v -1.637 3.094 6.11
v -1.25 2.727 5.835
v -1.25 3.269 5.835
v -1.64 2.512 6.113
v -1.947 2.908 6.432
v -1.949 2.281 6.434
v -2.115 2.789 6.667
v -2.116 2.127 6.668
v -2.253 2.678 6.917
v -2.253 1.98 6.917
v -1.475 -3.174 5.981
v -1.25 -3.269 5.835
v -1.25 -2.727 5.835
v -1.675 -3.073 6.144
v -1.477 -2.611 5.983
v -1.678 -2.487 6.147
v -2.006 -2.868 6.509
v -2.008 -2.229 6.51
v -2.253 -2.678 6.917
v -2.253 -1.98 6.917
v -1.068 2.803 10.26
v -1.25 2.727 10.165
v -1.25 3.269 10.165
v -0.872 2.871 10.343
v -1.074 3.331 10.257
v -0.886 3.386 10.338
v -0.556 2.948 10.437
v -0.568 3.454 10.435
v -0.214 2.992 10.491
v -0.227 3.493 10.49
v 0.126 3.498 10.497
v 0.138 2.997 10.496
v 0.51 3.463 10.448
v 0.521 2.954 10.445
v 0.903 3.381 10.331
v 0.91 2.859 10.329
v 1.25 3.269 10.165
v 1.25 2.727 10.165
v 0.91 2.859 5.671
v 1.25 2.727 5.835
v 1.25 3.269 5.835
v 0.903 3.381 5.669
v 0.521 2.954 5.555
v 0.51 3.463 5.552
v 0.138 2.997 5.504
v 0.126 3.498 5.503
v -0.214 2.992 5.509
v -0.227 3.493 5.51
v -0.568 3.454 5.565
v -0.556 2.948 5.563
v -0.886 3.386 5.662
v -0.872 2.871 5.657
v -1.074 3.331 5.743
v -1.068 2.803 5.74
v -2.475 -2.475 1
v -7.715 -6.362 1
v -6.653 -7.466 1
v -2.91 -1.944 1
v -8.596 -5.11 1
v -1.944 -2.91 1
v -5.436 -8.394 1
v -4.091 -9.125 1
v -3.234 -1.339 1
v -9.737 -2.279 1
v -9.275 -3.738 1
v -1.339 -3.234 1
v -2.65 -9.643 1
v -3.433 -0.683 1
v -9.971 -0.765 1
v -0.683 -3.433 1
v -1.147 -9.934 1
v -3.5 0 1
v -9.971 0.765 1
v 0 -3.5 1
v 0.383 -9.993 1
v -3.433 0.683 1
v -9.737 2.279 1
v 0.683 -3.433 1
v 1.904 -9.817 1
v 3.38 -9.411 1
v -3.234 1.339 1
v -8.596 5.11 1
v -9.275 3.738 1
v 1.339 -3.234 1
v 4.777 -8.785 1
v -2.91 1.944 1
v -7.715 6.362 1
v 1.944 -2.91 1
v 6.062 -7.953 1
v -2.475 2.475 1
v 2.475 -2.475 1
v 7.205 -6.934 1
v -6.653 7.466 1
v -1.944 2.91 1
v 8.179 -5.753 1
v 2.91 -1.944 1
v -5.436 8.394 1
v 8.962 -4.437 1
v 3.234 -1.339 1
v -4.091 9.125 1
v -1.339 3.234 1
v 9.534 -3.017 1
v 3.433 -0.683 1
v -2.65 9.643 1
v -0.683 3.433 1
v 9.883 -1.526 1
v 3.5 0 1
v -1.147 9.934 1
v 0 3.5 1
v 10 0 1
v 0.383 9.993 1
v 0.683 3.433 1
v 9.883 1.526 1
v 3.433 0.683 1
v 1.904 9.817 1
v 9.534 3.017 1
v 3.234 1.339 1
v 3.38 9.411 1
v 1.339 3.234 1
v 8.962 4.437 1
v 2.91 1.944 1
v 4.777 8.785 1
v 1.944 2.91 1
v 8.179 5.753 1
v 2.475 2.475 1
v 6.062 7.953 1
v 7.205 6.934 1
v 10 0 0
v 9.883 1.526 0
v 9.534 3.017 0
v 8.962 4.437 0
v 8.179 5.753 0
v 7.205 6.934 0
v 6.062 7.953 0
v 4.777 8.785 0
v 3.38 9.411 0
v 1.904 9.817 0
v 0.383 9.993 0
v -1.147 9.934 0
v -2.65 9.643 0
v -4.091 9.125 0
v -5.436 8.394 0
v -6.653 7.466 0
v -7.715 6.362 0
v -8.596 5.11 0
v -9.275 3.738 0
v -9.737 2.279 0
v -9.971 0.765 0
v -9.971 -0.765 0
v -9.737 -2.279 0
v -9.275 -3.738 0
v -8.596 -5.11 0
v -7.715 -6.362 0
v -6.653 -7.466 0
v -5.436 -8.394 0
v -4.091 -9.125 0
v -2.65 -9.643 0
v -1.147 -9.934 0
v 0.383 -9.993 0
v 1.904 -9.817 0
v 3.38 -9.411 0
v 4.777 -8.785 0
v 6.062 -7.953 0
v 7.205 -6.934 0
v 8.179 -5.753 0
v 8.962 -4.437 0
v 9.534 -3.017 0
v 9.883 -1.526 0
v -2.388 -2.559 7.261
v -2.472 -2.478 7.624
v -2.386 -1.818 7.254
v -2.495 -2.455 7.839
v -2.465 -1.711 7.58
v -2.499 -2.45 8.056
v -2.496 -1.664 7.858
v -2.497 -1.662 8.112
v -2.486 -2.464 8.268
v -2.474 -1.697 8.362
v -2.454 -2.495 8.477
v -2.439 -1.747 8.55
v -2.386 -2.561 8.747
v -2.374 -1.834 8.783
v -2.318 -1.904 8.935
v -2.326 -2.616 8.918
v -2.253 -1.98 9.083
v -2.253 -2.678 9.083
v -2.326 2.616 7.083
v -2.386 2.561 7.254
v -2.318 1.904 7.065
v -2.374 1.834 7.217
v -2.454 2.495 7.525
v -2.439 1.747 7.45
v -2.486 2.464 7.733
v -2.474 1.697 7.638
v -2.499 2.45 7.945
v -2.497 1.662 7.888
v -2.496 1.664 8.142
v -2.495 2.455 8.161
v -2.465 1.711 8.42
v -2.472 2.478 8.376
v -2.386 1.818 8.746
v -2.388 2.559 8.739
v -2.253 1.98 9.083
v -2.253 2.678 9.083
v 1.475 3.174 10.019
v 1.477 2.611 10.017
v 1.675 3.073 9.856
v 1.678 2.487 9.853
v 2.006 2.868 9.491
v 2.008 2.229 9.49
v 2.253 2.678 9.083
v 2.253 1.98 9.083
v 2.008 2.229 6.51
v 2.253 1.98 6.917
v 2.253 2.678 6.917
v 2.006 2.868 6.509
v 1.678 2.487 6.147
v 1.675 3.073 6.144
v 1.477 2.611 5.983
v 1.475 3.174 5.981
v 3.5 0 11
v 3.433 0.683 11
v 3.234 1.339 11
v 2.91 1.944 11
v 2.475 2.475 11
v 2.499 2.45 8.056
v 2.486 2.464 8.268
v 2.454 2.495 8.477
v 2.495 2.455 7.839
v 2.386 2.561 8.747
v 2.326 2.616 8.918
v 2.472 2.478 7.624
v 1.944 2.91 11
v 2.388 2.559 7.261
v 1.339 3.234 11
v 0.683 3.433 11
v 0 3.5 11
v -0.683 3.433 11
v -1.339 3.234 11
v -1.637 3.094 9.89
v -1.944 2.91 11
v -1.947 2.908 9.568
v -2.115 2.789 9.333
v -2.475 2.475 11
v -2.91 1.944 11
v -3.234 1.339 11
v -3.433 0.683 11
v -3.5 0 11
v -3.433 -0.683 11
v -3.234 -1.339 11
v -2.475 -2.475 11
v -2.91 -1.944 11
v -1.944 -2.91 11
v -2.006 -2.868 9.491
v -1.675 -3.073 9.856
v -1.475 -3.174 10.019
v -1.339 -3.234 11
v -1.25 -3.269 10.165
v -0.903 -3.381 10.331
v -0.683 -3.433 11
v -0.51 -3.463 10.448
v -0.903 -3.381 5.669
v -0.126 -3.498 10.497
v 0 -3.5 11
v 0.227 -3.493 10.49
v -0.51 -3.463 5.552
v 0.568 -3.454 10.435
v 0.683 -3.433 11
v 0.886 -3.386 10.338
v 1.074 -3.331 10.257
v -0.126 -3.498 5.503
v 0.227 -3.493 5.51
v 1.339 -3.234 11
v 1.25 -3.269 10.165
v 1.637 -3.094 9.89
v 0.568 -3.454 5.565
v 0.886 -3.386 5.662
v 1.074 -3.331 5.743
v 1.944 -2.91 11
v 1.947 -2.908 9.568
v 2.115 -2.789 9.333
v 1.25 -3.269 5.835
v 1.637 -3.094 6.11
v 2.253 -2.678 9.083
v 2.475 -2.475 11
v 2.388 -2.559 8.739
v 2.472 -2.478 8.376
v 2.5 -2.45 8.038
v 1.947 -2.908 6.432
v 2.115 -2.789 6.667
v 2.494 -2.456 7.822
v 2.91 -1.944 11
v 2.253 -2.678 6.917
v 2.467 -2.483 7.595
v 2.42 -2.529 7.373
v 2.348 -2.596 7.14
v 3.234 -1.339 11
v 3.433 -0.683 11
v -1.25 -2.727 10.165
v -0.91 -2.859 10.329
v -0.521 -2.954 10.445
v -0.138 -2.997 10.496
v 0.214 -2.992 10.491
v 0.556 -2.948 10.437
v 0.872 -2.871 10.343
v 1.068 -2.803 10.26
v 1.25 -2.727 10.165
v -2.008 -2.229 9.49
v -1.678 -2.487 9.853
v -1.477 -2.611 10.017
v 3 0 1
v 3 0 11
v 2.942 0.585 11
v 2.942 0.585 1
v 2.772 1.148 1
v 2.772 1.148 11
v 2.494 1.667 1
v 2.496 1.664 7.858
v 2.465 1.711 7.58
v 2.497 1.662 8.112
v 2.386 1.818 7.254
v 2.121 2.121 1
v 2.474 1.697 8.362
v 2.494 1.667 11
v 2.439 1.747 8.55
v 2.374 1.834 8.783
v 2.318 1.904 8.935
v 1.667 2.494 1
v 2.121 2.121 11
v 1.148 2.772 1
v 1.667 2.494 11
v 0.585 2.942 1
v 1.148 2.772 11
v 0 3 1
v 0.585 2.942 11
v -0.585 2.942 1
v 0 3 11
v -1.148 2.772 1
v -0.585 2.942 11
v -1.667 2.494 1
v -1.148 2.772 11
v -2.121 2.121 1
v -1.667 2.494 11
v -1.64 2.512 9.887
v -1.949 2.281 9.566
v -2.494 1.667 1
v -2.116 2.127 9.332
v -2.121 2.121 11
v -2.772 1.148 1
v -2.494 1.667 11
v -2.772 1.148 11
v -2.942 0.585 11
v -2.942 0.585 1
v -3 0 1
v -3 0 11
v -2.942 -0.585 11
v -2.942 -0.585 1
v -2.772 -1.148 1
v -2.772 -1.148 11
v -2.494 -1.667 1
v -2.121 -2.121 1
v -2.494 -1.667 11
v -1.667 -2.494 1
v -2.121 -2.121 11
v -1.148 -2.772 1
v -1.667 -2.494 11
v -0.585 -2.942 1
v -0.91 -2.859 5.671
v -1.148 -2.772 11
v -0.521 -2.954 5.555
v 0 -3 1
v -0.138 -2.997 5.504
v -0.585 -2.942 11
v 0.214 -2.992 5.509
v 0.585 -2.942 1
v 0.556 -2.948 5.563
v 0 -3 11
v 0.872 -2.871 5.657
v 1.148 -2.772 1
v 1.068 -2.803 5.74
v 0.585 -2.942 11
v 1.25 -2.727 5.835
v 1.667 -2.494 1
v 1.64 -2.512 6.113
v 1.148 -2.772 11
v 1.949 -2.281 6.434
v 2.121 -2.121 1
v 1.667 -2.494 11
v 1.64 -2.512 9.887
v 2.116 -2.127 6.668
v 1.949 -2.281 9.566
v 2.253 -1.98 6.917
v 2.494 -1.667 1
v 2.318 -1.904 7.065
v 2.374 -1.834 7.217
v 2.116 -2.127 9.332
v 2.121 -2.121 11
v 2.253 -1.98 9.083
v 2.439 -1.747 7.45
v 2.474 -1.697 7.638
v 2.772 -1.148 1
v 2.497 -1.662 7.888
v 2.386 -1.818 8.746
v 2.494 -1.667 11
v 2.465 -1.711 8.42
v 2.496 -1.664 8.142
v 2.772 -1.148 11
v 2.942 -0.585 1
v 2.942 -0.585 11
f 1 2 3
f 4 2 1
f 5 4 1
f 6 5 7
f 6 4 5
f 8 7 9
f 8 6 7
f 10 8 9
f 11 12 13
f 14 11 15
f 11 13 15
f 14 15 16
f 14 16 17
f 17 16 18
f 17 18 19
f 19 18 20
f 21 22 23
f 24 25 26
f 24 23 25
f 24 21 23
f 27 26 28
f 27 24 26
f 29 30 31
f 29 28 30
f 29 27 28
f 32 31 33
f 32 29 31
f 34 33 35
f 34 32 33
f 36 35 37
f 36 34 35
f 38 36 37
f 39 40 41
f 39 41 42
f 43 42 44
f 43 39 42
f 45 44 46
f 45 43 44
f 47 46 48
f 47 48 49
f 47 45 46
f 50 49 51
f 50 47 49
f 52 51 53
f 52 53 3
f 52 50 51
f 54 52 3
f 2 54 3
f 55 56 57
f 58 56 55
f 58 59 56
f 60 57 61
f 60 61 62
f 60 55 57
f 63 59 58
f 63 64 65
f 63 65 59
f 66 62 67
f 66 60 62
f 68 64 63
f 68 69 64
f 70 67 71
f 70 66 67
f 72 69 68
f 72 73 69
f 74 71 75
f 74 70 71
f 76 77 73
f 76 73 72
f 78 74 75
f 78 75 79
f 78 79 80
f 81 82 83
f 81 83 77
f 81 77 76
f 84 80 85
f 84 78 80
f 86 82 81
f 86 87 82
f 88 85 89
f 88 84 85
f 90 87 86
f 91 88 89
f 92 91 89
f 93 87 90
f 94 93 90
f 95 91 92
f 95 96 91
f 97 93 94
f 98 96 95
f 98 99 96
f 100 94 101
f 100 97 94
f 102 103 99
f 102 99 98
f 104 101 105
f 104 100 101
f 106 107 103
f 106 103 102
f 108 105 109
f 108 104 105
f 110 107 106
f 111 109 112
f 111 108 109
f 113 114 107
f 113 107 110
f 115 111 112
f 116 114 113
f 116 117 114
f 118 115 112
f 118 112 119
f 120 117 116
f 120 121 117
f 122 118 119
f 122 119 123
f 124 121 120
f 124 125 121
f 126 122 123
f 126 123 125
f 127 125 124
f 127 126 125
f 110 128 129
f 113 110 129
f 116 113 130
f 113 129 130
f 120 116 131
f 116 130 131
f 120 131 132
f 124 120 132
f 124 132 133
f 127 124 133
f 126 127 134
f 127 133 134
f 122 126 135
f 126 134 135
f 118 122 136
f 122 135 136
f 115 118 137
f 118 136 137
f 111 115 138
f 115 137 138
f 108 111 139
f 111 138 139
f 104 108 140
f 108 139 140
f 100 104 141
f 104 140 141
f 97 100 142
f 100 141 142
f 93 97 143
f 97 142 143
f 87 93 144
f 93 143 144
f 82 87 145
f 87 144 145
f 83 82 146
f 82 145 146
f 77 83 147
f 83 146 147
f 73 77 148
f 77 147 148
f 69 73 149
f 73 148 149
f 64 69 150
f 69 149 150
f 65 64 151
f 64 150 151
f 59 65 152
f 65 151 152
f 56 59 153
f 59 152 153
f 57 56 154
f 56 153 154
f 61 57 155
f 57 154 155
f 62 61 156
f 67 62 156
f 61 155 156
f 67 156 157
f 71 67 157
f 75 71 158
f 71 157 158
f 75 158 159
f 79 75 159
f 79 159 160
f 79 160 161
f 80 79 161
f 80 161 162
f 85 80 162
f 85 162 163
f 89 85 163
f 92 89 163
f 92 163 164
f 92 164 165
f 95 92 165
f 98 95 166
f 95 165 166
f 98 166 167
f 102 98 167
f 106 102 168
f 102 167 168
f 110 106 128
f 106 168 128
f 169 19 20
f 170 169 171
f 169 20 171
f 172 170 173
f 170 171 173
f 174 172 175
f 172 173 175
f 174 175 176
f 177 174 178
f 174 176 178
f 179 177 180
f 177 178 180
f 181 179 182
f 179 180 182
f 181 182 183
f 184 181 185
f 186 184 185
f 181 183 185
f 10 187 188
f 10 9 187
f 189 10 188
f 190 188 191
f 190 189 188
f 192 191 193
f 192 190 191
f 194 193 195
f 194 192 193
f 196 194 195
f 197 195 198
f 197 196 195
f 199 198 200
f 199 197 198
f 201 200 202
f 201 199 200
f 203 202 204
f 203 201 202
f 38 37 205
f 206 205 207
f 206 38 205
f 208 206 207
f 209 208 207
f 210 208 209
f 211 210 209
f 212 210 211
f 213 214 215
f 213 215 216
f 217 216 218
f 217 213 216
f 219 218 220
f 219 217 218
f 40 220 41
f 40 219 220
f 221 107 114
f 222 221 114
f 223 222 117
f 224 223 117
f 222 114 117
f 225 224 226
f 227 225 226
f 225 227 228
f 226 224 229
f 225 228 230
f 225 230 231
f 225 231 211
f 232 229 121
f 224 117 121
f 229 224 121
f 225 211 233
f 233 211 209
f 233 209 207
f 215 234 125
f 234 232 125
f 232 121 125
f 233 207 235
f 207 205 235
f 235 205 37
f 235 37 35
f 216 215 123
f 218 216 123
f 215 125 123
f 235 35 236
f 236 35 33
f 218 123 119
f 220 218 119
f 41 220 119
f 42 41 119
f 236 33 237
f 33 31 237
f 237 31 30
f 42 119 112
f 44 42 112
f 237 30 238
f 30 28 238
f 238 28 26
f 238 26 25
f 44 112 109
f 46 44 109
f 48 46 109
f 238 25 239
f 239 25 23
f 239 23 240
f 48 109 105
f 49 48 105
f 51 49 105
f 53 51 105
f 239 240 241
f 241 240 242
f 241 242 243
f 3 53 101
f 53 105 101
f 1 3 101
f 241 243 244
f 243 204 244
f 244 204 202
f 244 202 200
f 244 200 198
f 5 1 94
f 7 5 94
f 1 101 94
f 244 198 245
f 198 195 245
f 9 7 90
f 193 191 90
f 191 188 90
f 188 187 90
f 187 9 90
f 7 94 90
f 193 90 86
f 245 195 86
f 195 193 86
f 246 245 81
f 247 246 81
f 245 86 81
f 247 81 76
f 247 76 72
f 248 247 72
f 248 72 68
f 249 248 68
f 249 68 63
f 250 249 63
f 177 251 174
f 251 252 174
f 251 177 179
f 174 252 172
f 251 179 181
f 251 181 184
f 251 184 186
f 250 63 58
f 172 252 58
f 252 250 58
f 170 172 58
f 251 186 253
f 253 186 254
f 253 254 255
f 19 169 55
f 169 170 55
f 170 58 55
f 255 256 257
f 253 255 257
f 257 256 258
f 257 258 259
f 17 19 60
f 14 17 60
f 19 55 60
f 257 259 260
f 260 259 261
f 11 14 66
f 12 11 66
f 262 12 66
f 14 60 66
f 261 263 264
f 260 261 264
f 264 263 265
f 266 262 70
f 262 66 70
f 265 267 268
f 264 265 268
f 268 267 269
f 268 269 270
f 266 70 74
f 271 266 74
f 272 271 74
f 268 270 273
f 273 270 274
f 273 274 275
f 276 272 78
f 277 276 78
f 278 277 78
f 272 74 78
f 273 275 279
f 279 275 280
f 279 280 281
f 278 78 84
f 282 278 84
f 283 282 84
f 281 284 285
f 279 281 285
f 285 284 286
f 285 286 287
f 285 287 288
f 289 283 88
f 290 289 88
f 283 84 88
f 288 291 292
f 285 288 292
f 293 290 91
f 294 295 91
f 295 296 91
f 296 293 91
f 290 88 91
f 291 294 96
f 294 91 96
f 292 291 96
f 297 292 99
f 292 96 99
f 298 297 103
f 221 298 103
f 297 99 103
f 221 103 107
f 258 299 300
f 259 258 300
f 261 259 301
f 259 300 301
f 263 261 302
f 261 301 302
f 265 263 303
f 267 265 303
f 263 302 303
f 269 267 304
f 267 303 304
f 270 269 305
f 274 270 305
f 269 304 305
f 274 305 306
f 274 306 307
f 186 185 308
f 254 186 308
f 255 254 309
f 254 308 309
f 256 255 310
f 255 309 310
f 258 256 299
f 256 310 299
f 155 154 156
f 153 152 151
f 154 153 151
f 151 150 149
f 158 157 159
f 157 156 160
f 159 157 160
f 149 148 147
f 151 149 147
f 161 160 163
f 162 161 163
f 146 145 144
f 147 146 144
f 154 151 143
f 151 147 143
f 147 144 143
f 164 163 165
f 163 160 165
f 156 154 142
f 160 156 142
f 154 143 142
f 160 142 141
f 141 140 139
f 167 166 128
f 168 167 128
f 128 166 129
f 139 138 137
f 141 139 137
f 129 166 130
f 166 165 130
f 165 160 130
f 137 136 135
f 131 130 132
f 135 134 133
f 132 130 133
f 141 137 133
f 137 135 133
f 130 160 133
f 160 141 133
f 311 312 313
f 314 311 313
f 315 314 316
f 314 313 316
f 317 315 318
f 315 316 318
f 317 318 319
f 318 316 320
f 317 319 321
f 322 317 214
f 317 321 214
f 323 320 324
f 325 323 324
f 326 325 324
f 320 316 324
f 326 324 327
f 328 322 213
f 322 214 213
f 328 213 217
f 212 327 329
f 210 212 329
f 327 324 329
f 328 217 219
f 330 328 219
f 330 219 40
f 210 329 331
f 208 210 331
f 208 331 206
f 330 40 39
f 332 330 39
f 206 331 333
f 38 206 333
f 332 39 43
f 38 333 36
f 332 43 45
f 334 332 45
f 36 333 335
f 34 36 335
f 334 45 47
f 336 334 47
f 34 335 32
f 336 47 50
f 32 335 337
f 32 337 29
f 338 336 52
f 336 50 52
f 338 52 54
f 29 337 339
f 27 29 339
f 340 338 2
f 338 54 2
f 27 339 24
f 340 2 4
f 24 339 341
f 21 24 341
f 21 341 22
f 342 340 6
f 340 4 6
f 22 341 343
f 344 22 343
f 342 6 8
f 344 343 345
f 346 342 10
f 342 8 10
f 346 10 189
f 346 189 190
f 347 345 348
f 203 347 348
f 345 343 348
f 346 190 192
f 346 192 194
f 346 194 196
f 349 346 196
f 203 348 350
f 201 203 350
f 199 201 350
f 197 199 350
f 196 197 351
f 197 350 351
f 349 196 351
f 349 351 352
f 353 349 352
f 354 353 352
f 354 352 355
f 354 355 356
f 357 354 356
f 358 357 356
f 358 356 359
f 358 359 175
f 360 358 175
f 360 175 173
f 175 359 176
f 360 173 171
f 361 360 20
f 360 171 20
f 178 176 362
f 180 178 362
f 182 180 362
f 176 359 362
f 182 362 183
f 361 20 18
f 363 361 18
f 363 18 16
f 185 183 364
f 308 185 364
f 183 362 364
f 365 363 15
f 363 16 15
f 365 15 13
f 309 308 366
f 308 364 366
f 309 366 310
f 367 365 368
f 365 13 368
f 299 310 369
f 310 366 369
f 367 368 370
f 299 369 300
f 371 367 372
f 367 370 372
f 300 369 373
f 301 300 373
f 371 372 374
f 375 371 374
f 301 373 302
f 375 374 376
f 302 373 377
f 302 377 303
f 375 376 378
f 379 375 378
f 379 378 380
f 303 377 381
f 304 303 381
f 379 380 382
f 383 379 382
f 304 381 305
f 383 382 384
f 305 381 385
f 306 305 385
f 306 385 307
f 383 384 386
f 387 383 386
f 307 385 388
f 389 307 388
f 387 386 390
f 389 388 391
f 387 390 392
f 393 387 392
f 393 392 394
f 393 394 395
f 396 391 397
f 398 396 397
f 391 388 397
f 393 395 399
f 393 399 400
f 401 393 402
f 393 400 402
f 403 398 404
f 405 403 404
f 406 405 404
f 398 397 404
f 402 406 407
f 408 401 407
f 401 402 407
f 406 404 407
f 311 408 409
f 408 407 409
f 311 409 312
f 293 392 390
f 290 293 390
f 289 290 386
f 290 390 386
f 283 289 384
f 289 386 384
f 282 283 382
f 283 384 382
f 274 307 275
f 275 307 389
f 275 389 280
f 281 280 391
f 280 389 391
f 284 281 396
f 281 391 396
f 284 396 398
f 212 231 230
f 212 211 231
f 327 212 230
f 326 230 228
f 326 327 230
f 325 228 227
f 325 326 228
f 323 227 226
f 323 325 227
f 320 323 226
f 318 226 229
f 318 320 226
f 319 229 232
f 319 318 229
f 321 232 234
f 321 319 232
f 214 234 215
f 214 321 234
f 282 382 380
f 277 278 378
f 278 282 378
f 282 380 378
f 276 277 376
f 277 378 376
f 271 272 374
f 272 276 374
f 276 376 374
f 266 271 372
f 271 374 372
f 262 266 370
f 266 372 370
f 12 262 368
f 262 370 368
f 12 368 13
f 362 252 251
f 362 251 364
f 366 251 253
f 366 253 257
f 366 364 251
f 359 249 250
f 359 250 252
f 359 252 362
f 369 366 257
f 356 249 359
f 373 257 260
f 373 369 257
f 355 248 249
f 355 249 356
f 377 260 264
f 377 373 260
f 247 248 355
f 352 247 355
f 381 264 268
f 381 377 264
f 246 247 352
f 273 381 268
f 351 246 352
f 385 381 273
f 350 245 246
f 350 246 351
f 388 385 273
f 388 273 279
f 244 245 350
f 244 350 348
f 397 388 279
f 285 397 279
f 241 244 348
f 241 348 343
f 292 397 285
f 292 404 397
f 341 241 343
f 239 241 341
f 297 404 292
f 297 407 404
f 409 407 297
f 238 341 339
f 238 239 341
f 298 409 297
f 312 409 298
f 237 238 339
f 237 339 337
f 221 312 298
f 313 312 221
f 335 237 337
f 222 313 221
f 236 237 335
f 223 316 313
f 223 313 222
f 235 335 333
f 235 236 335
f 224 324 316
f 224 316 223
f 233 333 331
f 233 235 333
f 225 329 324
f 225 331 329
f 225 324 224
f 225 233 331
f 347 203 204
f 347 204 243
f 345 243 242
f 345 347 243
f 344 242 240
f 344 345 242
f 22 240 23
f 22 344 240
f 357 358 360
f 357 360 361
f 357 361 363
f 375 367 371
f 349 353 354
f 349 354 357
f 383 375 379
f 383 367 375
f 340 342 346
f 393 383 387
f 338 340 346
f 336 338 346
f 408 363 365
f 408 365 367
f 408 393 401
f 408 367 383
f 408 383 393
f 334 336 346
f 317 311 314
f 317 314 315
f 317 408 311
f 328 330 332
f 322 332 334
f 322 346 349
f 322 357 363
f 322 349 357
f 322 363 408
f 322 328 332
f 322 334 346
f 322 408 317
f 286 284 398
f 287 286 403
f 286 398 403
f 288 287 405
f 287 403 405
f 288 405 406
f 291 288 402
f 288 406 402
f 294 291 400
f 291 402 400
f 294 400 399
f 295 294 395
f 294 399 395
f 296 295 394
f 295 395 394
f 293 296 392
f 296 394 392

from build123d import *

# Parameters (mm, degrees)
CROQUIS1_R              = 10
SALIENTE_EXTRUIR1_DEPTH = 1
CROQUIS2_R              = 3.5
SALIENTE_EXTRUIR2_DEPTH = 10
CROQUIS3_R              = 3
CORTAR_EXTRUIR1_DEPTH   = 10
CORTAR_EXTRUIR2_DEPTH   = 10


with BuildPart() as part:
    # Croquis1 → Saliente-Extruir1 (new body)
    with BuildSketch(Plane.XY):
        Circle(CROQUIS1_R)
    extrude(amount=SALIENTE_EXTRUIR1_DEPTH)

    # Croquis2 → Saliente-Extruir2 (add)
    with BuildSketch(Plane.XY.offset(1)):
        Circle(CROQUIS2_R)
    extrude(amount=SALIENTE_EXTRUIR2_DEPTH)

    # Croquis3 → Cortar-Extruir1 (cut)
    with BuildSketch(Plane.XY.offset(11)):
        Circle(CROQUIS3_R)
    extrude(amount=-CORTAR_EXTRUIR1_DEPTH, mode=Mode.SUBTRACT)

    # Croquis4 → Cortar-Extruir2 (cut)
    with BuildSketch(Plane(origin=(0, 0, 0), x_dir=(1, 0, 0), z_dir=(0, 1, 0))):
        with BuildLine():
            ThreePointArc((1.25, -5.834936491), (0, -5.5), (-1.25, -5.834936491))
            ThreePointArc((-1.25, -5.834936491), (-1.833451245, -6.300454022), (-2.253469547, -6.917468245))
            ThreePointArc((-2.253469547, -6.917468245), (-2.5, -8), (-2.253469547, -9.082531755))
            ThreePointArc((-2.253469547, -9.082531755), (-1.833451245, -9.699545978), (-1.25, -10.165063509))
            ThreePointArc((-1.25, -10.165063509), (0, -10.5), (1.25, -10.165063509))
            ThreePointArc((1.25, -10.165063509), (1.833451245, -9.699545978), (2.253469547, -9.082531755))
            ThreePointArc((2.253469547, -9.082531755), (2.5, -8), (2.253469547, -6.917468245))
            ThreePointArc((2.253469547, -6.917468245), (1.833451245, -6.300454022), (1.25, -5.834936491))
        make_face()
    cortar_extruir2 = extrude(amount=-CORTAR_EXTRUIR2_DEPTH, mode=Mode.SUBTRACT)

    # Simetría1: Cortar-Extruir2 across plane
    add(cortar_extruir2.mirror(Plane.ZX), mode=Mode.SUBTRACT)


solid = part.part
